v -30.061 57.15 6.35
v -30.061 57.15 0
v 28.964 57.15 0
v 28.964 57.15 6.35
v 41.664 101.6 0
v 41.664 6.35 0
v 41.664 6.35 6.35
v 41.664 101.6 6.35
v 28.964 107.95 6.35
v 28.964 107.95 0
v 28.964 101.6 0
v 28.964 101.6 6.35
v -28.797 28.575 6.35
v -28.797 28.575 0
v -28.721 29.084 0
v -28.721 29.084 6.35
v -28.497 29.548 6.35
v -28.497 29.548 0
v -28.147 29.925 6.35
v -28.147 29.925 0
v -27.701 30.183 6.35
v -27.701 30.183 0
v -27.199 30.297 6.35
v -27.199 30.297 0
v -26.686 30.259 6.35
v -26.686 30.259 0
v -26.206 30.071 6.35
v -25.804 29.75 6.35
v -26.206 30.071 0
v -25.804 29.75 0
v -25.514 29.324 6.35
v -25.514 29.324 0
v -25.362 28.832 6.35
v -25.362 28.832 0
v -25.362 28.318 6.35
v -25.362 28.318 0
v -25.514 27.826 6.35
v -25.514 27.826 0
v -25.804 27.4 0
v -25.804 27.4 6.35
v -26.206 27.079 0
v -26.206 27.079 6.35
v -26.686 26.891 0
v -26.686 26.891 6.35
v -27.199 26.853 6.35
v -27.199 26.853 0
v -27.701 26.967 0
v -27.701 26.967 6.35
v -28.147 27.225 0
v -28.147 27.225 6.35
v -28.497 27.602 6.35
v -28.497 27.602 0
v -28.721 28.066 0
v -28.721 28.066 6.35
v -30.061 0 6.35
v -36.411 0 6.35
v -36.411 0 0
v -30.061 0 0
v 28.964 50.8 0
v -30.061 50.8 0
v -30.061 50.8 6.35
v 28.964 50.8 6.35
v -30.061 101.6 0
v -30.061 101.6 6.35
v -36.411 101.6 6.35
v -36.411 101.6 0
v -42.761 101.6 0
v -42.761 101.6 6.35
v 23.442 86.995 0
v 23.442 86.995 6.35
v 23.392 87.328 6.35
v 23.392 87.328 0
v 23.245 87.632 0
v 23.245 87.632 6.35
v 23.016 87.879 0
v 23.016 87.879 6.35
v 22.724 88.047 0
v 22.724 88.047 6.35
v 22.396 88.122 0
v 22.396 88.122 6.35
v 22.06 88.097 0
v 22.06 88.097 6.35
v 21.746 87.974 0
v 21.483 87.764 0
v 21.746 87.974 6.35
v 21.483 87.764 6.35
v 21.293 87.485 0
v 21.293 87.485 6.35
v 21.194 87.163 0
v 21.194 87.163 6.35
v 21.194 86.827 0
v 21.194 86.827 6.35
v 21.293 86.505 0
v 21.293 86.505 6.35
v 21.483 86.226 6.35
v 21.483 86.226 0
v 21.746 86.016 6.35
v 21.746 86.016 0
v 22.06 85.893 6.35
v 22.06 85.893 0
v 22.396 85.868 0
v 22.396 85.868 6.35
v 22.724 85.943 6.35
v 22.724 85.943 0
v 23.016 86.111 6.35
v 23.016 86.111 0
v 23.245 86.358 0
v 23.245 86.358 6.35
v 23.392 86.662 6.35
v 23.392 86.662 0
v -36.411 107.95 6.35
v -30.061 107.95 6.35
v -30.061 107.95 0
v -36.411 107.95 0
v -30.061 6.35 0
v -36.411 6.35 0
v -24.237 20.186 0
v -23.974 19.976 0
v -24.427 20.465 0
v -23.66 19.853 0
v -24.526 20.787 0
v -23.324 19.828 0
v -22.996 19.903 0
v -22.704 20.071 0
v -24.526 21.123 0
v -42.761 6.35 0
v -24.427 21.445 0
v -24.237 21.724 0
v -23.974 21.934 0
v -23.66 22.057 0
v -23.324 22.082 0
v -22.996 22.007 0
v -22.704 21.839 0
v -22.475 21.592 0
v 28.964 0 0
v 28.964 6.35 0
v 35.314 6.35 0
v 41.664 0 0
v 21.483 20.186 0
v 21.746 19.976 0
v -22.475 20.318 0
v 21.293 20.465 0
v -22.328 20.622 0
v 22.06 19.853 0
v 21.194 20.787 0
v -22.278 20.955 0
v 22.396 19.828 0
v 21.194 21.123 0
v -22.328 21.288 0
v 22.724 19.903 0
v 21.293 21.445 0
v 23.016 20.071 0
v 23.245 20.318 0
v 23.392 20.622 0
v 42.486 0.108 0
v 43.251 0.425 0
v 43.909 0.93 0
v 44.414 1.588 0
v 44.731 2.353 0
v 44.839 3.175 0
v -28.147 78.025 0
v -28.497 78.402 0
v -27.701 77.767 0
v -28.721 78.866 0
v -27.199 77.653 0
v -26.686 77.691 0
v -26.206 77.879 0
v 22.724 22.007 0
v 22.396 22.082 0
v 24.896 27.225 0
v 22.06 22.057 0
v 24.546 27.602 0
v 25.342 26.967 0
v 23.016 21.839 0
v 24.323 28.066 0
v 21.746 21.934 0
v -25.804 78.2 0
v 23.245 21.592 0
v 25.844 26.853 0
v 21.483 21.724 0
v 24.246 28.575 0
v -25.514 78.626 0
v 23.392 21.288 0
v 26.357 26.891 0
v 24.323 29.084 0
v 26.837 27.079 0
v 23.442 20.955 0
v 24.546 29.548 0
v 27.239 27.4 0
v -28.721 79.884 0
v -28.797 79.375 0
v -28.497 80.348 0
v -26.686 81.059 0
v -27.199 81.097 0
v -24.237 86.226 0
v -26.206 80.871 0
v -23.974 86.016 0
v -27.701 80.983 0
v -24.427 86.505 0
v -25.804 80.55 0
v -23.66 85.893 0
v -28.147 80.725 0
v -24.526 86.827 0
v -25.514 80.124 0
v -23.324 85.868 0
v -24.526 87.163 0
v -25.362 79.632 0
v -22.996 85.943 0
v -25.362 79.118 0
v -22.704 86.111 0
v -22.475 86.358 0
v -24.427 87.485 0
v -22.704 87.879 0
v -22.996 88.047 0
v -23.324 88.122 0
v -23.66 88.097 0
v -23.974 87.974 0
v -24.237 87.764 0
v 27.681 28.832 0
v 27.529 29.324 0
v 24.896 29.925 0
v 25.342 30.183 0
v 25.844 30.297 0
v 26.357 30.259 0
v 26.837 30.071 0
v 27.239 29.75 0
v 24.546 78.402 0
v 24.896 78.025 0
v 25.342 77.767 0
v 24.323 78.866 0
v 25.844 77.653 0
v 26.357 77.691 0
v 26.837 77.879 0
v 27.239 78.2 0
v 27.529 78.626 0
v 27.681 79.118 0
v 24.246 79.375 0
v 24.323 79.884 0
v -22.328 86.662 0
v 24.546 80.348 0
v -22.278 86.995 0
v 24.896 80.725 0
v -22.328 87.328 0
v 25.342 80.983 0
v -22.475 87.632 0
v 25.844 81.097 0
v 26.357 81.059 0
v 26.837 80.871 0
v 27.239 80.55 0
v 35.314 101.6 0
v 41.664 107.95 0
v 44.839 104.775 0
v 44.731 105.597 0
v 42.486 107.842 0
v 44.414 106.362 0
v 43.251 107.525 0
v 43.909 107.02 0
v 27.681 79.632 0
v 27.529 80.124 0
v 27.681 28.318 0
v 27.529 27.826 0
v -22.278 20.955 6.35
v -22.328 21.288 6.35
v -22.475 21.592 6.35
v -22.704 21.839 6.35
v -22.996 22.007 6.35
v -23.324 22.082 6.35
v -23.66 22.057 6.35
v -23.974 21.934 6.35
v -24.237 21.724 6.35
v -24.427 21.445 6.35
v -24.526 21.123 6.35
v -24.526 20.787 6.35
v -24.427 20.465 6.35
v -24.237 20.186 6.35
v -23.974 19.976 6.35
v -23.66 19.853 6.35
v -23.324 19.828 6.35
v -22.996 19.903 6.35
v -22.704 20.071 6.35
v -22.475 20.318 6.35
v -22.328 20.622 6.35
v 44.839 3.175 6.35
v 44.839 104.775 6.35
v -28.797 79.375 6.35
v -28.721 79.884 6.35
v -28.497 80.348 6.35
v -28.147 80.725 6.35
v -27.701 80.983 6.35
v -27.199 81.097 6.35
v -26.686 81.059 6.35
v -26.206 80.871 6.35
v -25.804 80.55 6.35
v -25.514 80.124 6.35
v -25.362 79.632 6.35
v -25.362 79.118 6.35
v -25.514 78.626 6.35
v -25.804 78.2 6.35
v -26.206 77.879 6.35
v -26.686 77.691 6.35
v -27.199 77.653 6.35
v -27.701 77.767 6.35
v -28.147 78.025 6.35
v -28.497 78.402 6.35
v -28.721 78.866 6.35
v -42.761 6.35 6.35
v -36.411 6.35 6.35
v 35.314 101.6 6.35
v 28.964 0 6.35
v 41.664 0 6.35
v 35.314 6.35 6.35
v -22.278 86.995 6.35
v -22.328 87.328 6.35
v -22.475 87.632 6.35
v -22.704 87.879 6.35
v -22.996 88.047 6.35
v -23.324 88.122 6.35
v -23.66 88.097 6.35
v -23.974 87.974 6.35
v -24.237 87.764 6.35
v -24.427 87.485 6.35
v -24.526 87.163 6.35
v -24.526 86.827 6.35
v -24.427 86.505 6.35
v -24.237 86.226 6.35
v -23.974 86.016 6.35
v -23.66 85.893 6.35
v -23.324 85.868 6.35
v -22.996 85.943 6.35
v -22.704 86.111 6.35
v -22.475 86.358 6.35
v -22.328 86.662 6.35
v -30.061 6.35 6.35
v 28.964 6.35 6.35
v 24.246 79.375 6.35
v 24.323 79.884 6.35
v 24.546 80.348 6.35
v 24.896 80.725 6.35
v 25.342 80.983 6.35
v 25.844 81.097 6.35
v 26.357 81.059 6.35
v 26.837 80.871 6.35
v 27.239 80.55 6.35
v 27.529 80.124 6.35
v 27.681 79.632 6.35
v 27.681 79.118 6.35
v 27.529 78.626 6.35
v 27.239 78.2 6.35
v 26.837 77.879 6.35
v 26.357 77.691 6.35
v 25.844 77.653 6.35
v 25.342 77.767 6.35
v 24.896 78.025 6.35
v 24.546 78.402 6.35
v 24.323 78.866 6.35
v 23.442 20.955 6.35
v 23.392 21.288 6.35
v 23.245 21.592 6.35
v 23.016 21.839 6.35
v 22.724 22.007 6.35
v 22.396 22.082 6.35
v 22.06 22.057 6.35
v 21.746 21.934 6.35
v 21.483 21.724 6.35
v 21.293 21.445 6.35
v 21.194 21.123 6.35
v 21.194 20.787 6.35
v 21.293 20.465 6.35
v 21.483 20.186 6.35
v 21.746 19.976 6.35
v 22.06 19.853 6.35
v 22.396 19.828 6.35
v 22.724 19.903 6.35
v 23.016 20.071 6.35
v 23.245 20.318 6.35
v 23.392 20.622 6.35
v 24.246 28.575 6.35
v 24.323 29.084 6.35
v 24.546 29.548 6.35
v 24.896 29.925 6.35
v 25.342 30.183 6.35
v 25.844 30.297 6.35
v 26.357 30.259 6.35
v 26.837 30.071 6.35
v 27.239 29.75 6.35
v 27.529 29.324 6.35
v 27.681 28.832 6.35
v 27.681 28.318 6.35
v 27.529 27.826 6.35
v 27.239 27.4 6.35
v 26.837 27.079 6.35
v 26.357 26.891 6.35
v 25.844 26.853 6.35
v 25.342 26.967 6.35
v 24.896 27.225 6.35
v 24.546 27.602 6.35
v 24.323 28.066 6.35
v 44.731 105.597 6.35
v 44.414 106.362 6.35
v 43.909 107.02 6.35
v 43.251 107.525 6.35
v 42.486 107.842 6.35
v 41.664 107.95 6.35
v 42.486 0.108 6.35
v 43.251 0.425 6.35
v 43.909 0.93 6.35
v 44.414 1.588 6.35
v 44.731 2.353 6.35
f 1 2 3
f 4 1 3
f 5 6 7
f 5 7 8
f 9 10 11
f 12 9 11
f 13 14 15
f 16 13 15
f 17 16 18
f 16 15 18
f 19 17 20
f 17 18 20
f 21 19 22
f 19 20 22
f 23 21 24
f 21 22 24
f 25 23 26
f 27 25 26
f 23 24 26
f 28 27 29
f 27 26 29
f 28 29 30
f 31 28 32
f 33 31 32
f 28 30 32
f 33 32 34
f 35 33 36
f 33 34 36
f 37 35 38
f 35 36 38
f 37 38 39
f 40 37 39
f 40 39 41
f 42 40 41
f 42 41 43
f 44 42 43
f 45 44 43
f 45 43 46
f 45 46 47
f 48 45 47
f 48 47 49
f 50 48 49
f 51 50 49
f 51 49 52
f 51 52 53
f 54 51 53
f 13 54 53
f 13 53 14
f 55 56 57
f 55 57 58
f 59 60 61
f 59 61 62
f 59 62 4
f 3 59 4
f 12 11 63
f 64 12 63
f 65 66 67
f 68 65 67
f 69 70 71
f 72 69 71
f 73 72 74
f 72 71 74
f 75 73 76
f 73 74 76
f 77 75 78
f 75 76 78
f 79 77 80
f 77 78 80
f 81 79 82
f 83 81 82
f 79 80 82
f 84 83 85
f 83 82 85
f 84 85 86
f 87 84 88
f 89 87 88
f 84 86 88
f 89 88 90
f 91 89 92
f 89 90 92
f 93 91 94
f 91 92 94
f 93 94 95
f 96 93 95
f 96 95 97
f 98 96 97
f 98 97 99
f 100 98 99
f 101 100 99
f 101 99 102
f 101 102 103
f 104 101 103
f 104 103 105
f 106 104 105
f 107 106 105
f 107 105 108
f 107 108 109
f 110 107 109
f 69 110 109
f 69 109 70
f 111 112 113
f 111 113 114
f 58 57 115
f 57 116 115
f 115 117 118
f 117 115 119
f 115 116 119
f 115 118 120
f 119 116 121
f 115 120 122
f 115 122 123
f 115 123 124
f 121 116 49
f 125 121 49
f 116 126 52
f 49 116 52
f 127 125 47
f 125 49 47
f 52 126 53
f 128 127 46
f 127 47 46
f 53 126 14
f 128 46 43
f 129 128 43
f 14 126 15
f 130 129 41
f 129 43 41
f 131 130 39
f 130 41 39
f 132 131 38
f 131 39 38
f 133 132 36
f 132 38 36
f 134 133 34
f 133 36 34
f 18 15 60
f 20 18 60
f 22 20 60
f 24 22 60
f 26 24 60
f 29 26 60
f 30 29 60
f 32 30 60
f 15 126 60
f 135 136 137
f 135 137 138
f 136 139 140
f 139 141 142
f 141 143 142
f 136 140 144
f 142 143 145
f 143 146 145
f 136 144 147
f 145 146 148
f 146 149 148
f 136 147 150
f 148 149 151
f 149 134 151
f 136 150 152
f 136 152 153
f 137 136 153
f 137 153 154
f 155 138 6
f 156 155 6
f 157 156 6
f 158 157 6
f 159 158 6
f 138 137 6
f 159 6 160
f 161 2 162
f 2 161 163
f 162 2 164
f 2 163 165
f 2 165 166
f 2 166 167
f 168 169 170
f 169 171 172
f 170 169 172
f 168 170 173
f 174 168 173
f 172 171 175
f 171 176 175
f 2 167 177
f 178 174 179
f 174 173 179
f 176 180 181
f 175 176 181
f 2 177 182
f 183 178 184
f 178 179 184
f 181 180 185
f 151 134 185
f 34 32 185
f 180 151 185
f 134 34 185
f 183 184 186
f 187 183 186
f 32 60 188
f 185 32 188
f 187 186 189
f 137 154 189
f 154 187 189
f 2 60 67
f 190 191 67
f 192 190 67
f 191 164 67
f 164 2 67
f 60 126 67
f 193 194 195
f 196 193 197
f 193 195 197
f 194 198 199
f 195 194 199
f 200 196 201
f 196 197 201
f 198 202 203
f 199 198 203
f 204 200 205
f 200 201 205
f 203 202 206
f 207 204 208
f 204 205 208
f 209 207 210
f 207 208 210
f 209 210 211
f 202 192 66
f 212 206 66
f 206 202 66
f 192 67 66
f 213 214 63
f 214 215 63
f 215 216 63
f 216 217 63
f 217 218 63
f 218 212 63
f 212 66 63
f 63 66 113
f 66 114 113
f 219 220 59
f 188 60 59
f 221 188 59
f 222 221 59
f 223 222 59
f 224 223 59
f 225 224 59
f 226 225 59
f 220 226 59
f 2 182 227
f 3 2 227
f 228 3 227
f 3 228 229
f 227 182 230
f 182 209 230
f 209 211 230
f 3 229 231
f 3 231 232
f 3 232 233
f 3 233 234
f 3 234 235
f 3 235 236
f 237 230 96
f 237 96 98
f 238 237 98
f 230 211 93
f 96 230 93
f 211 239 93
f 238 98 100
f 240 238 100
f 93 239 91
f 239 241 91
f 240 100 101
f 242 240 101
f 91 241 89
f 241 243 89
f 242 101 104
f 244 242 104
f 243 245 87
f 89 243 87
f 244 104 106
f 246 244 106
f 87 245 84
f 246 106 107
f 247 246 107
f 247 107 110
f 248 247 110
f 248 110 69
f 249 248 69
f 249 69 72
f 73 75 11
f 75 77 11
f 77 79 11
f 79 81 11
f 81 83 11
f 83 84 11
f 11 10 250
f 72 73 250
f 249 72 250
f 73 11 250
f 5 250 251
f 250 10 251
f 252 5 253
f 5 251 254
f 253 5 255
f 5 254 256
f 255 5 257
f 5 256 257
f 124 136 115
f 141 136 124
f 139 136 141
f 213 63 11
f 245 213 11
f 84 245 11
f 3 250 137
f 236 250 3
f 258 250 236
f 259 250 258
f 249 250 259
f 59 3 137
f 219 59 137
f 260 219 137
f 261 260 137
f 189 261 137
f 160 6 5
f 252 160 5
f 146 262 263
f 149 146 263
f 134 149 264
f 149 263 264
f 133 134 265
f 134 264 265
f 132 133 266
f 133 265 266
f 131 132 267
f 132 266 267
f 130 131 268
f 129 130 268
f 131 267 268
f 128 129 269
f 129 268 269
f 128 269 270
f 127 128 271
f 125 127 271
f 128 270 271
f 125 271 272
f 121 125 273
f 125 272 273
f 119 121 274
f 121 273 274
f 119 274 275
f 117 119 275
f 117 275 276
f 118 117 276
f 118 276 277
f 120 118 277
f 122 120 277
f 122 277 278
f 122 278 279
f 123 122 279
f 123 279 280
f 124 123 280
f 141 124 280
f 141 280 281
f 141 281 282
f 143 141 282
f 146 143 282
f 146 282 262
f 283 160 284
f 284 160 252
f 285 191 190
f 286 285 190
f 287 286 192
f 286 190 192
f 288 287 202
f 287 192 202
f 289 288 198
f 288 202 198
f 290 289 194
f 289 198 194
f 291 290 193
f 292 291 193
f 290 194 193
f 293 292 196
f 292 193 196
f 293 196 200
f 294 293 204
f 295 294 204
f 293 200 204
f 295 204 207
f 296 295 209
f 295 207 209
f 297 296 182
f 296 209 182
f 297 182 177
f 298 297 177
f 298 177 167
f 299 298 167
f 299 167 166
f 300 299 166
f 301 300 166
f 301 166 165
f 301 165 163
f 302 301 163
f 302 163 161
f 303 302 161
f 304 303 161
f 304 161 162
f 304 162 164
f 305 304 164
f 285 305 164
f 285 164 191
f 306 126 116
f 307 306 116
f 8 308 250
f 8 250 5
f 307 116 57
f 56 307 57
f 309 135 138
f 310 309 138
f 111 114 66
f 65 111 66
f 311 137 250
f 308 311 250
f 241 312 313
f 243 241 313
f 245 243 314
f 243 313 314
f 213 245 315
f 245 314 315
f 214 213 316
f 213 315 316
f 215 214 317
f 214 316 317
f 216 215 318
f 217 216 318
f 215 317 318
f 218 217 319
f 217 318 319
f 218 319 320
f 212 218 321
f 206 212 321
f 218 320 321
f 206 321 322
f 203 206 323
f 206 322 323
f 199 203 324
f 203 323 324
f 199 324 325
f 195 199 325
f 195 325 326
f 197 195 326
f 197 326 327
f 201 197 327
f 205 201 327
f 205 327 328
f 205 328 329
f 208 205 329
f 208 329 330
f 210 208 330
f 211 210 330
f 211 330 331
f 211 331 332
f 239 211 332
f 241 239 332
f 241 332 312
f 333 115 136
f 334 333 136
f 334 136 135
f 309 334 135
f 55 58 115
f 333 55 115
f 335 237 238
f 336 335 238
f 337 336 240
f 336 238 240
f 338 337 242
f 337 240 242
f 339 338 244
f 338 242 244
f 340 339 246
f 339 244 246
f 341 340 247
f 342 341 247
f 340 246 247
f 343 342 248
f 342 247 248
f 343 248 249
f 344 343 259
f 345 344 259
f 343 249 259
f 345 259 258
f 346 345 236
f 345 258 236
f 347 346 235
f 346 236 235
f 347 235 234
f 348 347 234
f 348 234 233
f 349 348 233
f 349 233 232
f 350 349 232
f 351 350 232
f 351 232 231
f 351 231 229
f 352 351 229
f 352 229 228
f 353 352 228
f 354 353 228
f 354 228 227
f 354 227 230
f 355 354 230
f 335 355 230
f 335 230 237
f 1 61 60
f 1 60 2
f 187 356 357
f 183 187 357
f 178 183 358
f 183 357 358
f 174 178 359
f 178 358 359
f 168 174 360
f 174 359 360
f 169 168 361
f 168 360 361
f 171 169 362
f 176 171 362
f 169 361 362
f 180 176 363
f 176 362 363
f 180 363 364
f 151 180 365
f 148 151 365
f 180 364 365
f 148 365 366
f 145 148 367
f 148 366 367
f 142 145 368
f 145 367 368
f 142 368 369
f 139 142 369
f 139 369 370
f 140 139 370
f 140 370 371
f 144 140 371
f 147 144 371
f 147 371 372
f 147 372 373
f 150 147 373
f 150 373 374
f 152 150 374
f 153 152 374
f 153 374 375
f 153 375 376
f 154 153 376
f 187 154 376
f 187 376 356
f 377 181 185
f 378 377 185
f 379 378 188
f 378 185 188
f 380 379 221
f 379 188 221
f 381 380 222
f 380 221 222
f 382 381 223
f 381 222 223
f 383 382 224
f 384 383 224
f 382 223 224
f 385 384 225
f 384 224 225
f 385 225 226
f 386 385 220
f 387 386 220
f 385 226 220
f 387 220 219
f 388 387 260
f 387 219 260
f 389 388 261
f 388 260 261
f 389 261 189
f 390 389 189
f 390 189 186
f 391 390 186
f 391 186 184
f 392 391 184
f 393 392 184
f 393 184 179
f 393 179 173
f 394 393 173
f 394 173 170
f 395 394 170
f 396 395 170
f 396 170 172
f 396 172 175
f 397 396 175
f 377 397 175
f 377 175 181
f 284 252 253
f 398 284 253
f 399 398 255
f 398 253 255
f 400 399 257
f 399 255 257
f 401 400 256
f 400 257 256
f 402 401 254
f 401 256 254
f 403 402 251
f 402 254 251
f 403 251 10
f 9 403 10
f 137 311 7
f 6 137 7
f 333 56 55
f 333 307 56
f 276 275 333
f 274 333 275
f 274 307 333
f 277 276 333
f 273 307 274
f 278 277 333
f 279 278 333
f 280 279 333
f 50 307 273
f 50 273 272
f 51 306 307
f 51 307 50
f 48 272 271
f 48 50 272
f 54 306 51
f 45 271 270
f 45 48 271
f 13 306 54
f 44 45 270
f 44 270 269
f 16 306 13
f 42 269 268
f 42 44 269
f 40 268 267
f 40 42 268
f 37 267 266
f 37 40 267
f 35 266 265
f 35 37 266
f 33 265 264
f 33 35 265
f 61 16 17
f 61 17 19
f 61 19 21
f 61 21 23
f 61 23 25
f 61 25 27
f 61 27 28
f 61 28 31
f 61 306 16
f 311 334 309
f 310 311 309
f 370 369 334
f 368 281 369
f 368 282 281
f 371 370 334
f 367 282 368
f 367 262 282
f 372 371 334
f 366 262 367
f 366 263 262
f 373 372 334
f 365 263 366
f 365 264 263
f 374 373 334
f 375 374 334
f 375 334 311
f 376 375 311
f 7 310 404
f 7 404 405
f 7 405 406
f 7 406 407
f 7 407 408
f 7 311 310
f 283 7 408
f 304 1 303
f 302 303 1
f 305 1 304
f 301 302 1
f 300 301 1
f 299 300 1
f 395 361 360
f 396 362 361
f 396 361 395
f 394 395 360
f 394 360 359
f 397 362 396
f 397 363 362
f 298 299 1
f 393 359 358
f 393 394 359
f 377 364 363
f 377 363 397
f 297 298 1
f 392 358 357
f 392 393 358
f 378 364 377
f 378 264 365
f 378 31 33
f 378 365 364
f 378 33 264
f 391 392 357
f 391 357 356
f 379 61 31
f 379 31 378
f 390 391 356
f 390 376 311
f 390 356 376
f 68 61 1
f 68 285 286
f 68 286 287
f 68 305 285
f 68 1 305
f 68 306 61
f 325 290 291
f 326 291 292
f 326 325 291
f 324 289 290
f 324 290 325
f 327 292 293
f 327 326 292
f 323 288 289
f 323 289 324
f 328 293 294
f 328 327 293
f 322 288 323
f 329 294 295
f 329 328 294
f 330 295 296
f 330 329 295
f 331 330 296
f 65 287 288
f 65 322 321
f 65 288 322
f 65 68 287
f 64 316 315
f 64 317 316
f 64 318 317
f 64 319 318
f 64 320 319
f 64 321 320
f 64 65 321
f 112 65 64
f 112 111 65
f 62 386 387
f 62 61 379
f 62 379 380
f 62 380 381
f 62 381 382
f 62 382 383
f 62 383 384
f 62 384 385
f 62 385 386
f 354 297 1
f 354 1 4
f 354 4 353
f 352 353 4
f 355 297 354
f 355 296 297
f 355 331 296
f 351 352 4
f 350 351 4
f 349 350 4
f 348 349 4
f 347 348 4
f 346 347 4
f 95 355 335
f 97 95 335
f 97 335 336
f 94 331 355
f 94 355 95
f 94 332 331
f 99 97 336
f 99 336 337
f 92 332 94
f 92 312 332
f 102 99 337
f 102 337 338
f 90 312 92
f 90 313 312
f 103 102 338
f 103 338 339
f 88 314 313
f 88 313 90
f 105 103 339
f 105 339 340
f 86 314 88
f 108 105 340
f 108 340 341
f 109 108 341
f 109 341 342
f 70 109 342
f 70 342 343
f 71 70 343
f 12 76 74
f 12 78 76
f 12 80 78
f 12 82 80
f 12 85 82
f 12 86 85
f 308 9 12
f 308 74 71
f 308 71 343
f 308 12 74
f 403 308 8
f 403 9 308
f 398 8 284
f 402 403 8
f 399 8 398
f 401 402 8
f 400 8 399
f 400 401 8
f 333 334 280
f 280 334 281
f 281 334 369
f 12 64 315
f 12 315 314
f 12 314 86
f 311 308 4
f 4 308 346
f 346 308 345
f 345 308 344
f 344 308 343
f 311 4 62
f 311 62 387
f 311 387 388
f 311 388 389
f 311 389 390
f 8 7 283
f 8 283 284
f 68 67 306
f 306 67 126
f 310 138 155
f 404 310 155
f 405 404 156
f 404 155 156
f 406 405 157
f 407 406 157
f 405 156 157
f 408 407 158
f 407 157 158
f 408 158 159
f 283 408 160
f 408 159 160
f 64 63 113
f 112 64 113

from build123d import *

# Parameters (mm, degrees)
SKETCH1_W                 = 59.0248375
SKETCH1_H                 = 6.35
SKETCH1_W_2               = 6.35
SKETCH1_H_2               = 95.25
BOSS_EXTRUDE1_DEPTH       = 6.35
TAP_DRILL_FOR_8_32_TAP4_D = 3.4544
TAP_DRILL_FOR_8_32_TAP5_D = 3.4544
TAP_DRILL_FOR_4_40_TAP1_D = 2.2606


with BuildPart() as part:
    # Sketch1 → Boss-Extrude1 (new body)
    with BuildSketch(Plane.XY):
        with BuildLine():
            Line((-36.4109, 0), (-30.0609, 0))
            Line((-30.0609, 0), (-30.0609, 6.35))
            Line((-30.0609, 6.35), (28.9639375, 6.35))
            Line((28.9639375, 6.35), (28.9639375, 0))
            Line((28.9639375, 0), (41.6639375, 0))
            ThreePointArc((41.6639375, 0), (43.90900153, 0.92993597), (44.8389375, 3.175))
            Line((44.8389375, 3.175), (44.8389375, 104.775))
            ThreePointArc((44.8389375, 104.775), (43.90900153, 107.02006403), (41.6639375, 107.95))
            Line((41.6639375, 107.95), (28.9639375, 107.95))
            Line((28.9639375, 107.95), (28.9639375, 101.6))
            Line((28.9639375, 101.6), (-30.0609, 101.6))
            Line((-30.0609, 101.6), (-30.0609, 107.95))
            Line((-30.0609, 107.95), (-36.4109, 107.95))
            Line((-36.4109, 107.95), (-36.4109, 101.6))
            Line((-36.4109, 101.6), (-42.7609, 101.6))
            Line((-42.7609, 101.6), (-42.7609, 6.35))
            Line((-42.7609, 6.35), (-36.4109, 6.35))
            Line((-36.4109, 6.35), (-36.4109, 0))
        make_face()
        with Locations((-0.54848125, 53.975)):
            Rectangle(SKETCH1_W, SKETCH1_H, mode=Mode.SUBTRACT)
        with Locations((38.4889375, 53.975)):
            Rectangle(SKETCH1_W_2, SKETCH1_H_2, mode=Mode.SUBTRACT)
    extrude(amount=BOSS_EXTRUDE1_DEPTH)

    # Tap Drill for #8-32 Tap4 (through all)
    with Locations(Plane(origin=(210.206342913, -81.87086846, 83.327875), x_dir=(1, 0, 0), z_dir=(0, 0, 1))):
        with Locations((-184.233255413, 161.24586846), (-184.233255413, 110.44586846), (-237.276392913, 110.44586846), (-237.276392913, 161.24586846)):
            Hole(TAP_DRILL_FOR_8_32_TAP4_D / 2)

    # Tap Drill for #8-32 Tap5 (through all)
    with Locations(Plane(origin=(210.206342913, -81.87086846, 6.35), x_dir=(1, 0, 0), z_dir=(0, 0, 1))):
        with Locations((-184.233255413, 161.24586846), (-184.233255413, 110.44586846), (-237.276392913, 110.44586846), (-237.276392913, 161.24586846)):
            Hole(TAP_DRILL_FOR_8_32_TAP5_D / 2)

    # Tap Drill for #4-40 Tap1 (through all)
    with Locations(Plane(origin=(210.206342913, -81.87086846, 0), x_dir=(-1, 0, 0), z_dir=(0, 0, -1))):
        with Locations((233.614824163, 168.86586846), (233.614824163, 102.82586846), (187.894824163, 102.82586846), (187.894824163, 168.86586846)):
            Hole(TAP_DRILL_FOR_4_40_TAP1_D / 2)


solid = part.part
